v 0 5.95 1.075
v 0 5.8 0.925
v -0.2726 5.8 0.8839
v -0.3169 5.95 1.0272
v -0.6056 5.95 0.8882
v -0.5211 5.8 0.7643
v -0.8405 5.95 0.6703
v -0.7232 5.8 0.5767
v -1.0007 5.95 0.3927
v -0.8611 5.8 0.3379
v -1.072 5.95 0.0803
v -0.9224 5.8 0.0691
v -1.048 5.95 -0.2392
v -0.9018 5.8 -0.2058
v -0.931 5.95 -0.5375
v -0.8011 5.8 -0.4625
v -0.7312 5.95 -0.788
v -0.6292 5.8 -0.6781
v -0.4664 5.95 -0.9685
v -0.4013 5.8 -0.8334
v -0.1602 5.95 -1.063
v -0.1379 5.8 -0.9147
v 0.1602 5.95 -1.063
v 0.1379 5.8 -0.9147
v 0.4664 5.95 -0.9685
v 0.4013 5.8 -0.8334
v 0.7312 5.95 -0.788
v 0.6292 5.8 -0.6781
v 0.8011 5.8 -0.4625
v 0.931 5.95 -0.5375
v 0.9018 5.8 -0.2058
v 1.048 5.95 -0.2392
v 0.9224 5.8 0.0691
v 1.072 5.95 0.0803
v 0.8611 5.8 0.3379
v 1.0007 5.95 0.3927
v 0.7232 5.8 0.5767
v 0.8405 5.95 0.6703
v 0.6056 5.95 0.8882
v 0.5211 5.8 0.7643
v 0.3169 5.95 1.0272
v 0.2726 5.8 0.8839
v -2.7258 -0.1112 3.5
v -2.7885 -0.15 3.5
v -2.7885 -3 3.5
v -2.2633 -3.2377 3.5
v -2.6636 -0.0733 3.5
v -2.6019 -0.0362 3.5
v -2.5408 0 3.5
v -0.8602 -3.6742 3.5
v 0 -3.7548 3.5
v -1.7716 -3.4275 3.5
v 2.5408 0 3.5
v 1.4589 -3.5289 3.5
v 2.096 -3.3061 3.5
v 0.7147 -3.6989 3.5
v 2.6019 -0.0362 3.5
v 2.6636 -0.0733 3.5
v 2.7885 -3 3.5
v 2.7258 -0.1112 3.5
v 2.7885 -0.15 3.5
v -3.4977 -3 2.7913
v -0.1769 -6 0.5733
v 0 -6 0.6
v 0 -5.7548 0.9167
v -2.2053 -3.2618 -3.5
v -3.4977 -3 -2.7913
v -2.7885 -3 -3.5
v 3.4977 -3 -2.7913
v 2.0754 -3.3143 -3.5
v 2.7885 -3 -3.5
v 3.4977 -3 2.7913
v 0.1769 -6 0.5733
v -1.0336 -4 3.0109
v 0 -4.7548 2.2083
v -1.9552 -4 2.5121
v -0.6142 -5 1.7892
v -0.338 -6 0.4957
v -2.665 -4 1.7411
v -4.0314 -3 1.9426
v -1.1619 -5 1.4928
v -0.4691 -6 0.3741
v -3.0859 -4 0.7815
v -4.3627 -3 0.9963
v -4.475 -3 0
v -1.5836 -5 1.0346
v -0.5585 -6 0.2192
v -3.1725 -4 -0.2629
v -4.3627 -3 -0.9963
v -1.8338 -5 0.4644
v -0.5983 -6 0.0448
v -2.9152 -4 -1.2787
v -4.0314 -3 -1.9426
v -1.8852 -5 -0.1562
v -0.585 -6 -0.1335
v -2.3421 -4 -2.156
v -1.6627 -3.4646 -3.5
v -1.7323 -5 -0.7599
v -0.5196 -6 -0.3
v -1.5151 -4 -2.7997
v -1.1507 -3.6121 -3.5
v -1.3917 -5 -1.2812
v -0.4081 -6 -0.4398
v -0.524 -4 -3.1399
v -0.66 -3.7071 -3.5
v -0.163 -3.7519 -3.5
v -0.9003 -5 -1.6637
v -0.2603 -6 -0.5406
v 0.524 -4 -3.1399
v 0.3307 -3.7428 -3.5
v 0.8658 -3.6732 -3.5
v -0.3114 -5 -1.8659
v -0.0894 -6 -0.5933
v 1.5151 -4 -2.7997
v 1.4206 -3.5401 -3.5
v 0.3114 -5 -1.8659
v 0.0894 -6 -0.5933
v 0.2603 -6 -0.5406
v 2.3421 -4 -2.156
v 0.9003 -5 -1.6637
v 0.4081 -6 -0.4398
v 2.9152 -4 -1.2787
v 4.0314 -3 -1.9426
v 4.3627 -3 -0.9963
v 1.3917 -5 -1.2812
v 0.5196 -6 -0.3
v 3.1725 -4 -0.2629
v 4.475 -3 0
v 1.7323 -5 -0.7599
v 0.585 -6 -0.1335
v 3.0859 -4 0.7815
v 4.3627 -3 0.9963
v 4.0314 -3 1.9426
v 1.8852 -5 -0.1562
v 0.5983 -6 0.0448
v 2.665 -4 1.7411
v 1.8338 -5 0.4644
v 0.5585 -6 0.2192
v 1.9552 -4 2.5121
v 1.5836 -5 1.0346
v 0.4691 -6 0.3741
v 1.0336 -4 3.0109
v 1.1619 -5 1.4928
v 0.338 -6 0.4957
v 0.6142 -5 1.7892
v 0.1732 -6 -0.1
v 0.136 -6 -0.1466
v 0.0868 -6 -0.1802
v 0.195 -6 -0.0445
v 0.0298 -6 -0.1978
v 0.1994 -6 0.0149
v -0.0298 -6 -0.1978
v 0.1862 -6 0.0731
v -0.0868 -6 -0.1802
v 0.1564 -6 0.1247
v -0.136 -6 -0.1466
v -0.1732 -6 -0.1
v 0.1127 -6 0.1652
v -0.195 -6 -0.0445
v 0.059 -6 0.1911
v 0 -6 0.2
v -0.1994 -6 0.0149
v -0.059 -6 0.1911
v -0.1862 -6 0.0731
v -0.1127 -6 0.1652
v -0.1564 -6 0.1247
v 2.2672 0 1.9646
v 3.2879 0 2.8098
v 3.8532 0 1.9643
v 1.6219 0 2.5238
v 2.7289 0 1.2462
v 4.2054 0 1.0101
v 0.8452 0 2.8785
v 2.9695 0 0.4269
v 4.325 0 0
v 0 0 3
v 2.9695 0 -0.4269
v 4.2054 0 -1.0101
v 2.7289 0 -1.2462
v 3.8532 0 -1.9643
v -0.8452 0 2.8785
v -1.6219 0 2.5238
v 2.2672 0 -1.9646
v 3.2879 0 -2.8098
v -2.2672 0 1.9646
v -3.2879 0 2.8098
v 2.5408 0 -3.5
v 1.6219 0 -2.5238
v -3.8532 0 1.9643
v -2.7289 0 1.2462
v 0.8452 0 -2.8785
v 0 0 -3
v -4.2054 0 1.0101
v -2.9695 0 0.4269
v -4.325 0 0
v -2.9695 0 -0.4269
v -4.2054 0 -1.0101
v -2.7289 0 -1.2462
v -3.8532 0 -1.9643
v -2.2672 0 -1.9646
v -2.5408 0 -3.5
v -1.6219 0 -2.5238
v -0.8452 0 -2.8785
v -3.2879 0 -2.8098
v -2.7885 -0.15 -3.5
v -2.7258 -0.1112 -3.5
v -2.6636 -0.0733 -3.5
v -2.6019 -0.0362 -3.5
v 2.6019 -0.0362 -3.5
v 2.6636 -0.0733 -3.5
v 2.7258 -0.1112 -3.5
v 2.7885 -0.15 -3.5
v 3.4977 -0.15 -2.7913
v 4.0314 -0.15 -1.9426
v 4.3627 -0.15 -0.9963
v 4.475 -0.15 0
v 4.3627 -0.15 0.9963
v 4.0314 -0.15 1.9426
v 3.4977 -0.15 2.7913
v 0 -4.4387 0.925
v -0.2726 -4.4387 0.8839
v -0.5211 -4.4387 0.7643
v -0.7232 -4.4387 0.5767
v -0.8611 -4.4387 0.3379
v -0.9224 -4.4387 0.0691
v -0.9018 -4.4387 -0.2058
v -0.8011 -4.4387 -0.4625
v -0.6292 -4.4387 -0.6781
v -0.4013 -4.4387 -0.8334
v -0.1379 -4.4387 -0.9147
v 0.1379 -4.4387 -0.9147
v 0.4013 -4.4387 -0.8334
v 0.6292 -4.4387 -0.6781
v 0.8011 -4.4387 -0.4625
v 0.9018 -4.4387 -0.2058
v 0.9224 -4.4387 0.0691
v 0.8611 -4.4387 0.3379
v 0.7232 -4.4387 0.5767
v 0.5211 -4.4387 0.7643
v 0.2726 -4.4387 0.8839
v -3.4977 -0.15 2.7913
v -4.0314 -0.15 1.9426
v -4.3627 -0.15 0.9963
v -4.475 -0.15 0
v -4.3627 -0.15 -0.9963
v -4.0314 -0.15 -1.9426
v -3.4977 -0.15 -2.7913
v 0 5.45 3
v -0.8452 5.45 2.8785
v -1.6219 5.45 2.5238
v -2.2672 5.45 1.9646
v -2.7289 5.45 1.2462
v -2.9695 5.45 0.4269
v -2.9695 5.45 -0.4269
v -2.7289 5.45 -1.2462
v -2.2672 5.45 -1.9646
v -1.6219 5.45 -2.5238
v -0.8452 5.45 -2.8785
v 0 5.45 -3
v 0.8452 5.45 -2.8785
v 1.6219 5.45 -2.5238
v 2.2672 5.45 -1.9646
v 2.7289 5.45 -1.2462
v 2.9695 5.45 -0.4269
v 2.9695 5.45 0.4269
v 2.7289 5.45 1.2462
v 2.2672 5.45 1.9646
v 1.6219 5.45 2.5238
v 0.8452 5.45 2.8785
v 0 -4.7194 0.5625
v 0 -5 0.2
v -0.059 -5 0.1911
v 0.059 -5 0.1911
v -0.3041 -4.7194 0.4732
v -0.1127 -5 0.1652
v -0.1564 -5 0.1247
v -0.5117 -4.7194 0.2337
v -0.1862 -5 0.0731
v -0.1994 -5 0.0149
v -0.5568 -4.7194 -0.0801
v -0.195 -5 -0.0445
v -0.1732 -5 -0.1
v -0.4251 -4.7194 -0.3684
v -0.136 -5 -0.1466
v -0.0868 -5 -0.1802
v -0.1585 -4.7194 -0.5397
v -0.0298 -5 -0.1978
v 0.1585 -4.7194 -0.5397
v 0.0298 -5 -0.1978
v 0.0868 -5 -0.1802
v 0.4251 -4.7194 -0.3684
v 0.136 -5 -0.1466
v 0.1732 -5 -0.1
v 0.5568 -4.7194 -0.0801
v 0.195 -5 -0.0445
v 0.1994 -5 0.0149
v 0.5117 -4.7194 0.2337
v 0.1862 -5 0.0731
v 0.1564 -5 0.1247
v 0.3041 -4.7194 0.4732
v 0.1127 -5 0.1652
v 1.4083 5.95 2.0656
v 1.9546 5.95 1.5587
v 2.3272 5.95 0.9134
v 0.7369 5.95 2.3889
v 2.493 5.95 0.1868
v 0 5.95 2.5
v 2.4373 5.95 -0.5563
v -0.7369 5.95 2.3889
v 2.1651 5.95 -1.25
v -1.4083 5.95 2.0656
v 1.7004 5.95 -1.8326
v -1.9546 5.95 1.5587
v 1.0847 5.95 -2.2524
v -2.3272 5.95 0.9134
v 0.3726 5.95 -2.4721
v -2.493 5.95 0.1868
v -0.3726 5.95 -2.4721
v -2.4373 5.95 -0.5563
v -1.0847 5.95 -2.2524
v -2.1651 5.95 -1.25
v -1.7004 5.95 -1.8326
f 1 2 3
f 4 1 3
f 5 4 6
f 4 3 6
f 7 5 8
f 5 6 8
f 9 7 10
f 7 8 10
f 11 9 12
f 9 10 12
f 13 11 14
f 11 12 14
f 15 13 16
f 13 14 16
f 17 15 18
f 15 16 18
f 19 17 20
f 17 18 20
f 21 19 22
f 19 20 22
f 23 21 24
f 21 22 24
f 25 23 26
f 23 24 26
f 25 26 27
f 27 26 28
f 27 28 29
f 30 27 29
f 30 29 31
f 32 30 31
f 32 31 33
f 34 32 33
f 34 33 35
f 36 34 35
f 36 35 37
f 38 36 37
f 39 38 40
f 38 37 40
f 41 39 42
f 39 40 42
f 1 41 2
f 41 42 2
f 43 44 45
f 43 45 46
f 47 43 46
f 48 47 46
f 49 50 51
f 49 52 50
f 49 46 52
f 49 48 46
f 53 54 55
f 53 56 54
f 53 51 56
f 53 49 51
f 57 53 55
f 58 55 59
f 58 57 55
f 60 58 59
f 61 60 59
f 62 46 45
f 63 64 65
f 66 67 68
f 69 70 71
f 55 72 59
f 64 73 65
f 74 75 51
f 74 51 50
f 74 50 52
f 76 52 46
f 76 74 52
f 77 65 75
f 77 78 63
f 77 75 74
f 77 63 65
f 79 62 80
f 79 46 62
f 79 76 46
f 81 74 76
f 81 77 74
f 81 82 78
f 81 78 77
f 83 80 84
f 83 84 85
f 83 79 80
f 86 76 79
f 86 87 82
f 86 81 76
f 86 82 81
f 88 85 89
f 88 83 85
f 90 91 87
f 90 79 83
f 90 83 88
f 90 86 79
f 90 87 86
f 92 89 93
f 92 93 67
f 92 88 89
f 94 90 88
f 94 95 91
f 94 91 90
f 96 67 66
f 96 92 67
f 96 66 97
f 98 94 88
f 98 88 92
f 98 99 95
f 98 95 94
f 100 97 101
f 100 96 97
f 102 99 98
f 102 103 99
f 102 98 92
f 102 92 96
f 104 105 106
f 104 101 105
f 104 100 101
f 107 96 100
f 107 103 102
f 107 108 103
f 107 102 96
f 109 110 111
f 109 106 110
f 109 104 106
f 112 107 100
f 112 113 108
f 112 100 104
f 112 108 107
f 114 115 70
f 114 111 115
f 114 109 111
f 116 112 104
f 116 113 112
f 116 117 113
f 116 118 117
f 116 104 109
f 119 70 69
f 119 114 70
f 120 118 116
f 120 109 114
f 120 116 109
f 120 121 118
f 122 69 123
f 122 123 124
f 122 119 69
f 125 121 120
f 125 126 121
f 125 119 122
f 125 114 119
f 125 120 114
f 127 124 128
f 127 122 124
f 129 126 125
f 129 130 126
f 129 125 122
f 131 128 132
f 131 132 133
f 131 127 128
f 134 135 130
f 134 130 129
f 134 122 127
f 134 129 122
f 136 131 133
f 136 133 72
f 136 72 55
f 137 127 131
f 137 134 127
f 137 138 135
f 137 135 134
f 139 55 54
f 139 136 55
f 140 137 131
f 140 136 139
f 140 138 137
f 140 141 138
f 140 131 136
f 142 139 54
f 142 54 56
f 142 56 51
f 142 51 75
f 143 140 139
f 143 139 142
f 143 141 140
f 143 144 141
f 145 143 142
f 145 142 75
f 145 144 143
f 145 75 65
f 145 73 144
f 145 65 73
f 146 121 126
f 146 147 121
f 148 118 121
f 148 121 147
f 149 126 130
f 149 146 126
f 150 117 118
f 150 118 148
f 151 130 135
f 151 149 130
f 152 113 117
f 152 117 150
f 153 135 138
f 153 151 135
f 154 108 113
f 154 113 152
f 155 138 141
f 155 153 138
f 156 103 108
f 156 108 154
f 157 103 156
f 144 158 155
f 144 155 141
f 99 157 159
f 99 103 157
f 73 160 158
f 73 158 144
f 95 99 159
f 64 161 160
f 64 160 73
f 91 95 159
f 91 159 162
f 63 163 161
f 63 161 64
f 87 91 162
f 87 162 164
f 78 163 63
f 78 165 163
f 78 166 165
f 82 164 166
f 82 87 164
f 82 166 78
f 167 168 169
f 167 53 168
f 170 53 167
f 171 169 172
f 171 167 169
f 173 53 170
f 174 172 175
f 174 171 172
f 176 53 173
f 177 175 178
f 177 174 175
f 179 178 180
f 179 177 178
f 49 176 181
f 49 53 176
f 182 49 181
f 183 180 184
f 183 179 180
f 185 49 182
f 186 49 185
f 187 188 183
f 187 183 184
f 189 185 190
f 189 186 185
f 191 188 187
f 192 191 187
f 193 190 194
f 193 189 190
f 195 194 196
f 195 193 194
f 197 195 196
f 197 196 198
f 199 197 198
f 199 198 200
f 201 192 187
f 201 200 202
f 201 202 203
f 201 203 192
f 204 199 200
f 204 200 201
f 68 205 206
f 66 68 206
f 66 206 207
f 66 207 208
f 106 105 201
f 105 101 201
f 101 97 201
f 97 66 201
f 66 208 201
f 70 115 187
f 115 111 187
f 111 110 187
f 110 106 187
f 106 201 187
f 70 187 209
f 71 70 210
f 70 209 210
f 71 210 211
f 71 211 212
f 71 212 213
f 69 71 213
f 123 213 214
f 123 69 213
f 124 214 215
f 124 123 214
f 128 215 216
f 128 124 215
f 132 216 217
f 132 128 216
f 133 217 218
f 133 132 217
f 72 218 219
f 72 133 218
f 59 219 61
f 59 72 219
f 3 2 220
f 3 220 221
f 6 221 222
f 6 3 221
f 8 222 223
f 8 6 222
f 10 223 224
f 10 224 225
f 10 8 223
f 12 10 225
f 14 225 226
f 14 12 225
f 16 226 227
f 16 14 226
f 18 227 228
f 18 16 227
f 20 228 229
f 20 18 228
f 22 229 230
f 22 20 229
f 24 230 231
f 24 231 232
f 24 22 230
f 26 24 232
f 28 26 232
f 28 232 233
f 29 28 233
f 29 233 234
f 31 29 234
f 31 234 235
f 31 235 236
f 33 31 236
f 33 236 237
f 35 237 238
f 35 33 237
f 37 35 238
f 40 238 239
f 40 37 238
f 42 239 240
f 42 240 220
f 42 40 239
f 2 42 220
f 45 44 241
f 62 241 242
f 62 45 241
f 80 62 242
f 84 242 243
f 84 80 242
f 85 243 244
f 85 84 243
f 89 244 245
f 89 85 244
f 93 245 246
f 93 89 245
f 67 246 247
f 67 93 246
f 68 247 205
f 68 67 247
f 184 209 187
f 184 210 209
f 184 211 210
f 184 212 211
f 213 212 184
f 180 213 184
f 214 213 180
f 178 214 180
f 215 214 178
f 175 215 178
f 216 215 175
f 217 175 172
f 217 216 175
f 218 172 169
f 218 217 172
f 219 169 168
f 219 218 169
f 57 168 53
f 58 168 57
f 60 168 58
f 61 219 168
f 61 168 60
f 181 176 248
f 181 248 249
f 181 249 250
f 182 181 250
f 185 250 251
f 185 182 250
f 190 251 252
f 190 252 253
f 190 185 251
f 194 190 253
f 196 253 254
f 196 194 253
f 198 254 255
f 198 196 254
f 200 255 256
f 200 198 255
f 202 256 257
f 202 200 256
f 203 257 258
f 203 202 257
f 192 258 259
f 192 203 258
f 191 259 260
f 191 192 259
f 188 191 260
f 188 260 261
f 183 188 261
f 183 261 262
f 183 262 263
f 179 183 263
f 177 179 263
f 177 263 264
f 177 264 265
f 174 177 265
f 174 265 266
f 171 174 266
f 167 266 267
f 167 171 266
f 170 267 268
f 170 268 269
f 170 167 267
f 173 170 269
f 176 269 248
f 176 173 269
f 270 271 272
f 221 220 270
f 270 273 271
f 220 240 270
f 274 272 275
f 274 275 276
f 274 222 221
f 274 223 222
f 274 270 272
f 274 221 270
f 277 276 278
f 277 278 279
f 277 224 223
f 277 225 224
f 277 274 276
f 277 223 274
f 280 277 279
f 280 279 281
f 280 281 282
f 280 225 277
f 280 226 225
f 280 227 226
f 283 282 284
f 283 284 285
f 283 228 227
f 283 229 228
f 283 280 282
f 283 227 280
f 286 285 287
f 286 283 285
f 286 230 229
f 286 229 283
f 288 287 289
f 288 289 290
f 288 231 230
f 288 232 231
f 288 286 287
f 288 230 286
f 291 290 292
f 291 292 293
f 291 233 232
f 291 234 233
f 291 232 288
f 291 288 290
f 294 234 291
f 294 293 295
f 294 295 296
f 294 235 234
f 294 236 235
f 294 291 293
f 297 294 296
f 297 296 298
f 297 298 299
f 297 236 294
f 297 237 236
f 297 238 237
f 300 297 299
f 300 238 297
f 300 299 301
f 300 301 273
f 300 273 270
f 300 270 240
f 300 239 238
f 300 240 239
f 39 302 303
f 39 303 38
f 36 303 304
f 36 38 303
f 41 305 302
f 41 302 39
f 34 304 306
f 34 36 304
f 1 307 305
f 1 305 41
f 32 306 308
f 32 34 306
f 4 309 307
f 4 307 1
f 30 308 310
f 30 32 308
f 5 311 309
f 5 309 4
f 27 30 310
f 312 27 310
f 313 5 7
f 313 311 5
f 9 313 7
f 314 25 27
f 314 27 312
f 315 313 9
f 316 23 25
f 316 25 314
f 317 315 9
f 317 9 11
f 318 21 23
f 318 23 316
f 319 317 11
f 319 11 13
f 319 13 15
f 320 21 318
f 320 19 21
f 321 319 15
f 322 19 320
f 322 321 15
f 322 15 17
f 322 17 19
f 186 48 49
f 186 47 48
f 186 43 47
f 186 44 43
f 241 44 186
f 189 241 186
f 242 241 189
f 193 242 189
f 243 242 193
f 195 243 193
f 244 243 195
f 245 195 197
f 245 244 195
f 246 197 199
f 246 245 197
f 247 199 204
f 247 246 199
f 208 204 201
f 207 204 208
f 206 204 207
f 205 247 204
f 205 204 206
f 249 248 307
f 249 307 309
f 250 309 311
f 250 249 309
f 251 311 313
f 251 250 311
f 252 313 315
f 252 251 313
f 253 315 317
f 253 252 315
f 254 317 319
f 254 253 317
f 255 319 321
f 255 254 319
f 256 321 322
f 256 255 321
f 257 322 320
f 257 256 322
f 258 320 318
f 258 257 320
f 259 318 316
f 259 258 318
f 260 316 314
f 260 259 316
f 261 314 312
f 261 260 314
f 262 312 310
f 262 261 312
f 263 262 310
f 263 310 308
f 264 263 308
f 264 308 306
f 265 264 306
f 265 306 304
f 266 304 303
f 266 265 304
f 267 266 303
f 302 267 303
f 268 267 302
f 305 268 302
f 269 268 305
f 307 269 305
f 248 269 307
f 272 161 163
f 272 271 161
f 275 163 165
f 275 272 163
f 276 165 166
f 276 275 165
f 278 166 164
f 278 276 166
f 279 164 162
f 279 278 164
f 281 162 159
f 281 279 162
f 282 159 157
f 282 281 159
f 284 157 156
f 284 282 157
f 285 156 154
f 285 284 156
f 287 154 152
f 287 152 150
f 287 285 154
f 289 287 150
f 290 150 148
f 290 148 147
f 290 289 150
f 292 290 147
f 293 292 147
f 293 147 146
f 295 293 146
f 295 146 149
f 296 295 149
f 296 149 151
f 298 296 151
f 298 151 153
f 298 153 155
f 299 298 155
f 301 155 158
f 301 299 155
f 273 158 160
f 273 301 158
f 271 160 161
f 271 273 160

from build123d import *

# Parameters (mm, degrees)
CUT_EXTRUDE1_REACH = 10.721
SKETCH2_W          = 5.576961538
SKETCH2_H          = 0.975
CHAMFER1_SIZE      = 0.5
CHAMFER2_SIZE      = 0.15


with BuildPart() as part:
    # Sketch1 → Revolve1 (revolve)
    with BuildSketch(Plane(origin=(0, 0, 0), x_dir=(0, 0, -1), z_dir=(1, 0, 0)), mode=Mode.PRIVATE) as revolve1_sk:
        Polygon((0.925, -4.438709677), (0.925, 5.95), (3, 5.95), (3, 0), (4.475, 0), (4.475, -3), (0.6, -6), (0.2, -6), (0.2, -5), align=None)
    revolve(revolve1_sk.sketch.rotate(Axis((0, 16.051202931, 0), (0, -1, 0)), 180), axis=Axis((0, 16.051202931, 0), (0, -1, 0)))

    # Cut-Extrude1: up to this cone (the profile starts inside it)
    cut_extrude1_end = Plane(origin=(0, 0, 0), z_dir=(0, 1, 0)).offset(-6.464515129) * Cone(1.292e-06, 33.629208333, 26.035515129, align=(Align.CENTER, Align.CENTER, Align.MIN), mode=Mode.PRIVATE)
    # Sketch2 → Cut-Extrude1 (cut, up to the surface)
    with BuildSketch(Plane(origin=(0, 0, 0), x_dir=(1, 0, 0), z_dir=(0, 1, 0)), mode=Mode.PRIVATE) as cut_extrude1_sk1:
        with Locations((0, -3.9875)):
            Rectangle(SKETCH2_W, SKETCH2_H)
    cut_extrude1_tool1 = extrude(cut_extrude1_sk1.sketch, amount=-CUT_EXTRUDE1_REACH, mode=Mode.PRIVATE) & cut_extrude1_end
    add(cut_extrude1_tool1.solids().sort_by_distance((0, 0, 3.9875))[0], mode=Mode.SUBTRACT)
    # Sketch2 → Cut-Extrude1 (cut, up to the surface)
    with BuildSketch(Plane(origin=(0, 0, 0), x_dir=(1, 0, 0), z_dir=(0, 1, 0)), mode=Mode.PRIVATE) as cut_extrude1_sk2:
        with Locations((0, 3.9875)):
            Rectangle(SKETCH2_W, SKETCH2_H)
    cut_extrude1_tool2 = extrude(cut_extrude1_sk2.sketch, amount=-CUT_EXTRUDE1_REACH, mode=Mode.PRIVATE) & cut_extrude1_end
    add(cut_extrude1_tool2.solids().sort_by_distance((0, 0, -3.9875))[0], mode=Mode.SUBTRACT)

    # Chamfer1
    chamfer1_edges = [part.edges().sort_by_distance(p)[0] for p in [
        (0, 5.95, -3),
    ]]
    chamfer(chamfer1_edges, length=CHAMFER1_SIZE)

    # Chamfer2
    chamfer2_edges = [part.edges().sort_by_distance(p)[0] for p in [
        (-4.475, 0, 0),
        (4.475, 0, 0),
        (0, 5.95, -0.925),
    ]]
    chamfer(chamfer2_edges, length=CHAMFER2_SIZE)


solid = part.part
